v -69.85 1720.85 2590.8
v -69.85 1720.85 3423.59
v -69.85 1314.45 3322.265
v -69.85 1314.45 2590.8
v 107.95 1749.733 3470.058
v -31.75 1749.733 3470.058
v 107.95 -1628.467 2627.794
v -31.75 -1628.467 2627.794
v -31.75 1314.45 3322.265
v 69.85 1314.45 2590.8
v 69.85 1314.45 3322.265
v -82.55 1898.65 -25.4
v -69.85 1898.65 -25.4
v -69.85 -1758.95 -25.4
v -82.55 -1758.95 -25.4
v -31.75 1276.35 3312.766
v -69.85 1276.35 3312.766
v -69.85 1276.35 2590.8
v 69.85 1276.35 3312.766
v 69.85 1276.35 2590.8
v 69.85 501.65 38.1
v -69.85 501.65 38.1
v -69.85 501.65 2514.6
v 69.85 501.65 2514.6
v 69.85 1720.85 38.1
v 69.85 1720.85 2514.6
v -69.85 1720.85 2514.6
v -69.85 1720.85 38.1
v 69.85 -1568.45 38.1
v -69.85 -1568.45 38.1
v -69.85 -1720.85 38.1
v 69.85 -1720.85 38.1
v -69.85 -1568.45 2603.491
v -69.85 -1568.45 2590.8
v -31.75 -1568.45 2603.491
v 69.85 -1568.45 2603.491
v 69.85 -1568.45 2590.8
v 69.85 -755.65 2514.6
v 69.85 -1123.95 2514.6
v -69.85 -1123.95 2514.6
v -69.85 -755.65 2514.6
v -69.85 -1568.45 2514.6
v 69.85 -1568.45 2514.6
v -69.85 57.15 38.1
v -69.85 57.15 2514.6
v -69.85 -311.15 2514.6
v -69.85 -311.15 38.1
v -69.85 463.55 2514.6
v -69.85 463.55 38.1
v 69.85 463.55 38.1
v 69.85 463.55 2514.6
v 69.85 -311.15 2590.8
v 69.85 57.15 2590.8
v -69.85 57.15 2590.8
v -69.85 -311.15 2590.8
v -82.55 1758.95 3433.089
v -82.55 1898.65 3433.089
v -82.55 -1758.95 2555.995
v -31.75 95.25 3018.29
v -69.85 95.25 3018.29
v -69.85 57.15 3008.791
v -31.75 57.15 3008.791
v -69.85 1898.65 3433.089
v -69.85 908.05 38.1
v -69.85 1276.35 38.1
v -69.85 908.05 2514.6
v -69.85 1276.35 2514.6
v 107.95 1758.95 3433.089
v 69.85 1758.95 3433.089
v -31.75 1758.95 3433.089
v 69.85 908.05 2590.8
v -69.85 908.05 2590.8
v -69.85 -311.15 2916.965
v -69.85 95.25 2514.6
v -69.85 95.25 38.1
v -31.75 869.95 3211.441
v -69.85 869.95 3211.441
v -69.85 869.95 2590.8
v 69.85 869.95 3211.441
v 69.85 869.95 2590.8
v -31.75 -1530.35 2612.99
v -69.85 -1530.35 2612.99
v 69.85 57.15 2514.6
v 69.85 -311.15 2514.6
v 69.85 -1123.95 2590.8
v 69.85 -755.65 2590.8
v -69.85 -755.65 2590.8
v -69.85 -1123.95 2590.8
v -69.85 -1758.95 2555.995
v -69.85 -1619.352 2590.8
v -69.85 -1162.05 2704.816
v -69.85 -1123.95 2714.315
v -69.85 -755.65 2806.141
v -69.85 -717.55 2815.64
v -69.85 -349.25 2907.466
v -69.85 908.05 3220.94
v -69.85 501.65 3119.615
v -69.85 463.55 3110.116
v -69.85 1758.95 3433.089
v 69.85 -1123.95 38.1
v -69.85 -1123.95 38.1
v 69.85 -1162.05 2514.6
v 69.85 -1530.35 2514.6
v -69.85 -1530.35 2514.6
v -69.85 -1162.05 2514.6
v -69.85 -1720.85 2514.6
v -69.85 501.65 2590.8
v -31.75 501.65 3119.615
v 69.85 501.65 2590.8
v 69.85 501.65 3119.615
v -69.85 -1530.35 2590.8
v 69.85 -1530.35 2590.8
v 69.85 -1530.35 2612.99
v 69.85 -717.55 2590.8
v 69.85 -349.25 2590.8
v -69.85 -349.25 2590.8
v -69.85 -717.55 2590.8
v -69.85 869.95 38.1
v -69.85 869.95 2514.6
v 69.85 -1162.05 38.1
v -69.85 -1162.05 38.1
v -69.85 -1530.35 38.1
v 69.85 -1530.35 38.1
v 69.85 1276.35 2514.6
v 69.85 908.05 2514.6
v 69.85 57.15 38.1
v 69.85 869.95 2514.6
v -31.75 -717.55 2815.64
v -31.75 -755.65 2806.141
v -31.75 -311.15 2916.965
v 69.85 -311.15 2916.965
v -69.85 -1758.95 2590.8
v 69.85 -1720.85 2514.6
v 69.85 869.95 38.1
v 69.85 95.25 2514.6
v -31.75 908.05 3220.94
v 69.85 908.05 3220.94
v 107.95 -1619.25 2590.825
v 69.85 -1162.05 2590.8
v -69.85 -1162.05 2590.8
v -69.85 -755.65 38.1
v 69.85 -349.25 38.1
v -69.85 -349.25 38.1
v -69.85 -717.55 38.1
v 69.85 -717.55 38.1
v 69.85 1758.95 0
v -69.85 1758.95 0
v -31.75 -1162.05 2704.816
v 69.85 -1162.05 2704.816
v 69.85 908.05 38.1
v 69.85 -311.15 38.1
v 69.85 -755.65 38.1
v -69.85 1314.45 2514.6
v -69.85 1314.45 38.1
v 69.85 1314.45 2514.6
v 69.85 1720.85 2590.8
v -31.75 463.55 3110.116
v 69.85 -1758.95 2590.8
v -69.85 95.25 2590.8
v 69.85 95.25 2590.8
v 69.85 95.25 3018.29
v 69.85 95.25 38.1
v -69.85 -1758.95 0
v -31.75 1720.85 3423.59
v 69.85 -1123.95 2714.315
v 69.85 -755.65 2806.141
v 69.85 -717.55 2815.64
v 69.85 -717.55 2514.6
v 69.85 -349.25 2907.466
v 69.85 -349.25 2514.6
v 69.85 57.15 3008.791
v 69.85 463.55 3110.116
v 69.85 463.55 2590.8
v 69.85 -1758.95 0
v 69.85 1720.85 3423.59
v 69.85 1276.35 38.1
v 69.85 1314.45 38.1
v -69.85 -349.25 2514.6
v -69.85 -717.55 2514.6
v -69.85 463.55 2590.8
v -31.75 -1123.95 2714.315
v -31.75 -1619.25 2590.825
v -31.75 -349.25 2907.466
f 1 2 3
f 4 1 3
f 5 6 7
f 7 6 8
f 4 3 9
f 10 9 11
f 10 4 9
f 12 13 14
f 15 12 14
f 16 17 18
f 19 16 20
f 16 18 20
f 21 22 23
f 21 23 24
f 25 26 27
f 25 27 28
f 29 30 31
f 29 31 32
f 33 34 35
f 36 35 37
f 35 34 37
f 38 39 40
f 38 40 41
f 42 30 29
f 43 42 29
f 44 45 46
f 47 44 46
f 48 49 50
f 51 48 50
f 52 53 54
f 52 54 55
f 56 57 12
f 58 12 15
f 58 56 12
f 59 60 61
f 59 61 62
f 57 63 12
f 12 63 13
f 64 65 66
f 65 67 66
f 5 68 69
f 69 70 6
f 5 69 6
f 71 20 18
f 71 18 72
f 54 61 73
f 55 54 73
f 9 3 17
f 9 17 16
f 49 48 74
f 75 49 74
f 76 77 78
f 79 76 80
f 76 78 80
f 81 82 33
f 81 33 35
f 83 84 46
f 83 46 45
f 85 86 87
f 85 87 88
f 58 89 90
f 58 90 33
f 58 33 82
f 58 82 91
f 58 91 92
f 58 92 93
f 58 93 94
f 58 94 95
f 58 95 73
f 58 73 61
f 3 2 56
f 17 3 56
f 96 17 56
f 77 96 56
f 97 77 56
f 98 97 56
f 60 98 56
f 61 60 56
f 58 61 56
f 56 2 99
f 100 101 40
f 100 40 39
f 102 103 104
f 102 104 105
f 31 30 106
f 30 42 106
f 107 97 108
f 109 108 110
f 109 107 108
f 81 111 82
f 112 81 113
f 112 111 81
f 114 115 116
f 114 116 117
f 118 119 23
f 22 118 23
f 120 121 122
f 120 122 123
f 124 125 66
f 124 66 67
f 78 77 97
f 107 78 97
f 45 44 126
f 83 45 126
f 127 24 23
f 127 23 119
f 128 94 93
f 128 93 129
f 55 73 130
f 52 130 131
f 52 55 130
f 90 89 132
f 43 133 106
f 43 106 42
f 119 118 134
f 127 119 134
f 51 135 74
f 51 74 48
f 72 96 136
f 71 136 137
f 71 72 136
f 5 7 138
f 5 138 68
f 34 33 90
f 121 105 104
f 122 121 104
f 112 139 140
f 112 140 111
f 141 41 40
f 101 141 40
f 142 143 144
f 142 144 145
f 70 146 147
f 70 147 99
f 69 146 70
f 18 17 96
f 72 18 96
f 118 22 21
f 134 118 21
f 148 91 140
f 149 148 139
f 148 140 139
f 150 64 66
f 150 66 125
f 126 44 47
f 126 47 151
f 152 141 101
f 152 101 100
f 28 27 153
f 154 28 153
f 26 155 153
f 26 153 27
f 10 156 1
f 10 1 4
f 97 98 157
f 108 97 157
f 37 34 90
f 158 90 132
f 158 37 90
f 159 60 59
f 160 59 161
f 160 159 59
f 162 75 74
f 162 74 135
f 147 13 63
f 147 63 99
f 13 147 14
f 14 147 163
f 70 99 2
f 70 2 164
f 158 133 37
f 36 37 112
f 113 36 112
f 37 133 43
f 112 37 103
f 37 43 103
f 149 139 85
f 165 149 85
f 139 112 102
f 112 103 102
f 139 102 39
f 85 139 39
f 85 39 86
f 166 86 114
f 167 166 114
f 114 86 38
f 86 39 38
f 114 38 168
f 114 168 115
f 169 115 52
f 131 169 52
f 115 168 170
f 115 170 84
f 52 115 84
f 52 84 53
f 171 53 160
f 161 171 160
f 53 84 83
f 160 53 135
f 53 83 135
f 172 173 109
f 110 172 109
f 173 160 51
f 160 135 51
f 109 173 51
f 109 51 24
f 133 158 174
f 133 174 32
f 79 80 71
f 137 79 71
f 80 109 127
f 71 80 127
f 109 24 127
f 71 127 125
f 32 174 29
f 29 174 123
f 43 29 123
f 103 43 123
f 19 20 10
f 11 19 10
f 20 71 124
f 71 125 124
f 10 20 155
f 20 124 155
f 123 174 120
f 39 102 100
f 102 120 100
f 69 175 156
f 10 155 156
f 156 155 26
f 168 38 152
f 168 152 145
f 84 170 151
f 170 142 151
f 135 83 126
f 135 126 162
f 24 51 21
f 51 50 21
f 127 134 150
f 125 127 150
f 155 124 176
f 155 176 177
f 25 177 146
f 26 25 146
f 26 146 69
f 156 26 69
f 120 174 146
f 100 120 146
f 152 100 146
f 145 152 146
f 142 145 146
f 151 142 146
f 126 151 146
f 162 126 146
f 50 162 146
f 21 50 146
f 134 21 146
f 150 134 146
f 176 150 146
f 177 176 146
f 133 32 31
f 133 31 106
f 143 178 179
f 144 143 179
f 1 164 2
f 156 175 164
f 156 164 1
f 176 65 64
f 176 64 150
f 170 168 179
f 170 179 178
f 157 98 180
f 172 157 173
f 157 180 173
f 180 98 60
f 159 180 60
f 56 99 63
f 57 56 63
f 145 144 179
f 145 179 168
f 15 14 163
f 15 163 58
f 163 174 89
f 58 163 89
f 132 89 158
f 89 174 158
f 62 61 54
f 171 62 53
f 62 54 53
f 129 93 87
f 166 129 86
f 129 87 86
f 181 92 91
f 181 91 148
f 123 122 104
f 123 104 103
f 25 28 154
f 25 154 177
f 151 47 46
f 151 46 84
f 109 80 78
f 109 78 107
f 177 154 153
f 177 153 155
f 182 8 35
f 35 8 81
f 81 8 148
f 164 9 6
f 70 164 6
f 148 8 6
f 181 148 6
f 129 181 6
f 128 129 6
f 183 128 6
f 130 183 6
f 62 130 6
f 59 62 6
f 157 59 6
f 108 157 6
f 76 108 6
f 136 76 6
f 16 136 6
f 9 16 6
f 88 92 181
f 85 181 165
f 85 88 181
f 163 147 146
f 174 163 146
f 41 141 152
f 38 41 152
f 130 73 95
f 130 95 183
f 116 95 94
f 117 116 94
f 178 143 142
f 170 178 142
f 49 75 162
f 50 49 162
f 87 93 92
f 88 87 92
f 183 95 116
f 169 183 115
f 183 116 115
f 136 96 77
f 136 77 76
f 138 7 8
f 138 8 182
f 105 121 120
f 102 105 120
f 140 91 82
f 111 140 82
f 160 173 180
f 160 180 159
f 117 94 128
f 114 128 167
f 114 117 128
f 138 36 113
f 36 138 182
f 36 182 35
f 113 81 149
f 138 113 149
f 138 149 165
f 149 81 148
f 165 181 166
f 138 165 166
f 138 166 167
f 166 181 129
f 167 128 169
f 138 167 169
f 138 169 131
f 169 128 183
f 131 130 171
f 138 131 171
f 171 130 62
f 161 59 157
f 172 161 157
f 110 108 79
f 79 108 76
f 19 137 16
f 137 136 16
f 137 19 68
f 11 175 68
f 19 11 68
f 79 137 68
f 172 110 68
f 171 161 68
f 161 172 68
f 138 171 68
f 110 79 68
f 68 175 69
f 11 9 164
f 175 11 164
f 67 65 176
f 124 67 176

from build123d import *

# Parameters (mm, degrees)
F0_W      = 139.7
F0_H      = 3517.9
F1_DEPTH  = 38.1
F3_DEPTH  = 139.7
F4_W      = 139.7
F4_H      = 38.1
F5_REACH  = 3576.7609868968
F6_W      = 38.1
F6_H      = 3481.6151260149
F7_DEPTH  = 38.1
F9_DEPTH  = 38.1
F11_DEPTH = 12.7


with BuildPart() as f1:
    # F0 (on Top) → F1 (new body)
    with BuildSketch(Plane.XY):
        Rectangle(F0_W, F0_H)
    extrude(amount=F1_DEPTH)

    # F2 (on face) → F3 (join, through all)
    with BuildSketch(Plane.YZ.offset(69.85)):
        Polygon((1720.85, 2590.8), (-1758.95, 2590.8), (-1758.95, 38.1), (-1720.85, 38.1), (-1720.85, 2514.6), (1720.85, 2514.6), (1720.85, 38.1), (1758.95, 38.1), (1758.95, 2590.8), (1758.95, 3433.0894), (1749.7329391709, 3470.0577079092), (-1628.4670608291, 2627.7937079092), (-1619.25, 2590.8254), (1720.85, 3423.5901819549), align=None)
    extrude(amount=-F3_DEPTH)

    f5_end = f1.faces().sort_by_distance((0, 50.8, 3007.2077909774))[0]
    # F4 (on face) → F5 (join, up to a face of the model that its end follows)
    with BuildSketch(Plane.XY.offset(38.1)):
        with Locations((0, 1295.4)):
            Rectangle(F4_W, F4_H)
        with Locations((0, 889)):
            Rectangle(F4_W, F4_H)
        with Locations((0, 482.6)):
            Rectangle(F4_W, F4_H)
        with Locations((0, 76.2)):
            Rectangle(F4_W, F4_H)
        with Locations((0, -330.2)):
            Rectangle(F4_W, F4_H)
        with Locations((0, -736.6)):
            Rectangle(F4_W, F4_H)
        with Locations((0, -1143)):
            Rectangle(F4_W, F4_H)
        with Locations((0, -1549.4)):
            Rectangle(F4_W, F4_H)
    f5_long = extrude(amount=F5_REACH, mode=Mode.PRIVATE)
    add(split(f5_long, bisect_by=f5_end, keep=Keep.TOP, mode=Mode.PRIVATE))

    # F6 (on face) → F7 (cut)
    with BuildSketch(Plane(origin=(0, -712.1315701529, 2856.2575039305), x_dir=(1, 0, 0), z_dir=(0, -0.2419176071, 0.9702967955))):
        with Locations((-50.8, 796.4207579507)):
            Rectangle(F6_W, F6_H)
    extrude(amount=-F7_DEPTH, mode=Mode.SUBTRACT)

    # F8 (on face) → F9 (join)
    with BuildSketch(Plane.YZ.offset(69.85)):
        Polygon((1749.7329391709, 3470.0577079092), (-1628.4670608291, 2627.7937079092), (-1619.25, 2590.8254), (1758.95, 3433.0894), align=None)
    extrude(amount=F9_DEPTH)

    # F10 (on face) → F11 (join)
    with BuildSketch(Plane(origin=(-69.85, 0, 0), x_dir=(0, -1, 0), z_dir=(-1, 0, 0))):
        Polygon((-1898.65, -25.4), (1758.95, -25.4), (1758.95, 2555.9949338346), (-1758.95, 3433.0894), (-1898.65, 3433.0894), (-1898.65, 0), align=None)
    extrude(amount=F11_DEPTH)


solid = f1.part
